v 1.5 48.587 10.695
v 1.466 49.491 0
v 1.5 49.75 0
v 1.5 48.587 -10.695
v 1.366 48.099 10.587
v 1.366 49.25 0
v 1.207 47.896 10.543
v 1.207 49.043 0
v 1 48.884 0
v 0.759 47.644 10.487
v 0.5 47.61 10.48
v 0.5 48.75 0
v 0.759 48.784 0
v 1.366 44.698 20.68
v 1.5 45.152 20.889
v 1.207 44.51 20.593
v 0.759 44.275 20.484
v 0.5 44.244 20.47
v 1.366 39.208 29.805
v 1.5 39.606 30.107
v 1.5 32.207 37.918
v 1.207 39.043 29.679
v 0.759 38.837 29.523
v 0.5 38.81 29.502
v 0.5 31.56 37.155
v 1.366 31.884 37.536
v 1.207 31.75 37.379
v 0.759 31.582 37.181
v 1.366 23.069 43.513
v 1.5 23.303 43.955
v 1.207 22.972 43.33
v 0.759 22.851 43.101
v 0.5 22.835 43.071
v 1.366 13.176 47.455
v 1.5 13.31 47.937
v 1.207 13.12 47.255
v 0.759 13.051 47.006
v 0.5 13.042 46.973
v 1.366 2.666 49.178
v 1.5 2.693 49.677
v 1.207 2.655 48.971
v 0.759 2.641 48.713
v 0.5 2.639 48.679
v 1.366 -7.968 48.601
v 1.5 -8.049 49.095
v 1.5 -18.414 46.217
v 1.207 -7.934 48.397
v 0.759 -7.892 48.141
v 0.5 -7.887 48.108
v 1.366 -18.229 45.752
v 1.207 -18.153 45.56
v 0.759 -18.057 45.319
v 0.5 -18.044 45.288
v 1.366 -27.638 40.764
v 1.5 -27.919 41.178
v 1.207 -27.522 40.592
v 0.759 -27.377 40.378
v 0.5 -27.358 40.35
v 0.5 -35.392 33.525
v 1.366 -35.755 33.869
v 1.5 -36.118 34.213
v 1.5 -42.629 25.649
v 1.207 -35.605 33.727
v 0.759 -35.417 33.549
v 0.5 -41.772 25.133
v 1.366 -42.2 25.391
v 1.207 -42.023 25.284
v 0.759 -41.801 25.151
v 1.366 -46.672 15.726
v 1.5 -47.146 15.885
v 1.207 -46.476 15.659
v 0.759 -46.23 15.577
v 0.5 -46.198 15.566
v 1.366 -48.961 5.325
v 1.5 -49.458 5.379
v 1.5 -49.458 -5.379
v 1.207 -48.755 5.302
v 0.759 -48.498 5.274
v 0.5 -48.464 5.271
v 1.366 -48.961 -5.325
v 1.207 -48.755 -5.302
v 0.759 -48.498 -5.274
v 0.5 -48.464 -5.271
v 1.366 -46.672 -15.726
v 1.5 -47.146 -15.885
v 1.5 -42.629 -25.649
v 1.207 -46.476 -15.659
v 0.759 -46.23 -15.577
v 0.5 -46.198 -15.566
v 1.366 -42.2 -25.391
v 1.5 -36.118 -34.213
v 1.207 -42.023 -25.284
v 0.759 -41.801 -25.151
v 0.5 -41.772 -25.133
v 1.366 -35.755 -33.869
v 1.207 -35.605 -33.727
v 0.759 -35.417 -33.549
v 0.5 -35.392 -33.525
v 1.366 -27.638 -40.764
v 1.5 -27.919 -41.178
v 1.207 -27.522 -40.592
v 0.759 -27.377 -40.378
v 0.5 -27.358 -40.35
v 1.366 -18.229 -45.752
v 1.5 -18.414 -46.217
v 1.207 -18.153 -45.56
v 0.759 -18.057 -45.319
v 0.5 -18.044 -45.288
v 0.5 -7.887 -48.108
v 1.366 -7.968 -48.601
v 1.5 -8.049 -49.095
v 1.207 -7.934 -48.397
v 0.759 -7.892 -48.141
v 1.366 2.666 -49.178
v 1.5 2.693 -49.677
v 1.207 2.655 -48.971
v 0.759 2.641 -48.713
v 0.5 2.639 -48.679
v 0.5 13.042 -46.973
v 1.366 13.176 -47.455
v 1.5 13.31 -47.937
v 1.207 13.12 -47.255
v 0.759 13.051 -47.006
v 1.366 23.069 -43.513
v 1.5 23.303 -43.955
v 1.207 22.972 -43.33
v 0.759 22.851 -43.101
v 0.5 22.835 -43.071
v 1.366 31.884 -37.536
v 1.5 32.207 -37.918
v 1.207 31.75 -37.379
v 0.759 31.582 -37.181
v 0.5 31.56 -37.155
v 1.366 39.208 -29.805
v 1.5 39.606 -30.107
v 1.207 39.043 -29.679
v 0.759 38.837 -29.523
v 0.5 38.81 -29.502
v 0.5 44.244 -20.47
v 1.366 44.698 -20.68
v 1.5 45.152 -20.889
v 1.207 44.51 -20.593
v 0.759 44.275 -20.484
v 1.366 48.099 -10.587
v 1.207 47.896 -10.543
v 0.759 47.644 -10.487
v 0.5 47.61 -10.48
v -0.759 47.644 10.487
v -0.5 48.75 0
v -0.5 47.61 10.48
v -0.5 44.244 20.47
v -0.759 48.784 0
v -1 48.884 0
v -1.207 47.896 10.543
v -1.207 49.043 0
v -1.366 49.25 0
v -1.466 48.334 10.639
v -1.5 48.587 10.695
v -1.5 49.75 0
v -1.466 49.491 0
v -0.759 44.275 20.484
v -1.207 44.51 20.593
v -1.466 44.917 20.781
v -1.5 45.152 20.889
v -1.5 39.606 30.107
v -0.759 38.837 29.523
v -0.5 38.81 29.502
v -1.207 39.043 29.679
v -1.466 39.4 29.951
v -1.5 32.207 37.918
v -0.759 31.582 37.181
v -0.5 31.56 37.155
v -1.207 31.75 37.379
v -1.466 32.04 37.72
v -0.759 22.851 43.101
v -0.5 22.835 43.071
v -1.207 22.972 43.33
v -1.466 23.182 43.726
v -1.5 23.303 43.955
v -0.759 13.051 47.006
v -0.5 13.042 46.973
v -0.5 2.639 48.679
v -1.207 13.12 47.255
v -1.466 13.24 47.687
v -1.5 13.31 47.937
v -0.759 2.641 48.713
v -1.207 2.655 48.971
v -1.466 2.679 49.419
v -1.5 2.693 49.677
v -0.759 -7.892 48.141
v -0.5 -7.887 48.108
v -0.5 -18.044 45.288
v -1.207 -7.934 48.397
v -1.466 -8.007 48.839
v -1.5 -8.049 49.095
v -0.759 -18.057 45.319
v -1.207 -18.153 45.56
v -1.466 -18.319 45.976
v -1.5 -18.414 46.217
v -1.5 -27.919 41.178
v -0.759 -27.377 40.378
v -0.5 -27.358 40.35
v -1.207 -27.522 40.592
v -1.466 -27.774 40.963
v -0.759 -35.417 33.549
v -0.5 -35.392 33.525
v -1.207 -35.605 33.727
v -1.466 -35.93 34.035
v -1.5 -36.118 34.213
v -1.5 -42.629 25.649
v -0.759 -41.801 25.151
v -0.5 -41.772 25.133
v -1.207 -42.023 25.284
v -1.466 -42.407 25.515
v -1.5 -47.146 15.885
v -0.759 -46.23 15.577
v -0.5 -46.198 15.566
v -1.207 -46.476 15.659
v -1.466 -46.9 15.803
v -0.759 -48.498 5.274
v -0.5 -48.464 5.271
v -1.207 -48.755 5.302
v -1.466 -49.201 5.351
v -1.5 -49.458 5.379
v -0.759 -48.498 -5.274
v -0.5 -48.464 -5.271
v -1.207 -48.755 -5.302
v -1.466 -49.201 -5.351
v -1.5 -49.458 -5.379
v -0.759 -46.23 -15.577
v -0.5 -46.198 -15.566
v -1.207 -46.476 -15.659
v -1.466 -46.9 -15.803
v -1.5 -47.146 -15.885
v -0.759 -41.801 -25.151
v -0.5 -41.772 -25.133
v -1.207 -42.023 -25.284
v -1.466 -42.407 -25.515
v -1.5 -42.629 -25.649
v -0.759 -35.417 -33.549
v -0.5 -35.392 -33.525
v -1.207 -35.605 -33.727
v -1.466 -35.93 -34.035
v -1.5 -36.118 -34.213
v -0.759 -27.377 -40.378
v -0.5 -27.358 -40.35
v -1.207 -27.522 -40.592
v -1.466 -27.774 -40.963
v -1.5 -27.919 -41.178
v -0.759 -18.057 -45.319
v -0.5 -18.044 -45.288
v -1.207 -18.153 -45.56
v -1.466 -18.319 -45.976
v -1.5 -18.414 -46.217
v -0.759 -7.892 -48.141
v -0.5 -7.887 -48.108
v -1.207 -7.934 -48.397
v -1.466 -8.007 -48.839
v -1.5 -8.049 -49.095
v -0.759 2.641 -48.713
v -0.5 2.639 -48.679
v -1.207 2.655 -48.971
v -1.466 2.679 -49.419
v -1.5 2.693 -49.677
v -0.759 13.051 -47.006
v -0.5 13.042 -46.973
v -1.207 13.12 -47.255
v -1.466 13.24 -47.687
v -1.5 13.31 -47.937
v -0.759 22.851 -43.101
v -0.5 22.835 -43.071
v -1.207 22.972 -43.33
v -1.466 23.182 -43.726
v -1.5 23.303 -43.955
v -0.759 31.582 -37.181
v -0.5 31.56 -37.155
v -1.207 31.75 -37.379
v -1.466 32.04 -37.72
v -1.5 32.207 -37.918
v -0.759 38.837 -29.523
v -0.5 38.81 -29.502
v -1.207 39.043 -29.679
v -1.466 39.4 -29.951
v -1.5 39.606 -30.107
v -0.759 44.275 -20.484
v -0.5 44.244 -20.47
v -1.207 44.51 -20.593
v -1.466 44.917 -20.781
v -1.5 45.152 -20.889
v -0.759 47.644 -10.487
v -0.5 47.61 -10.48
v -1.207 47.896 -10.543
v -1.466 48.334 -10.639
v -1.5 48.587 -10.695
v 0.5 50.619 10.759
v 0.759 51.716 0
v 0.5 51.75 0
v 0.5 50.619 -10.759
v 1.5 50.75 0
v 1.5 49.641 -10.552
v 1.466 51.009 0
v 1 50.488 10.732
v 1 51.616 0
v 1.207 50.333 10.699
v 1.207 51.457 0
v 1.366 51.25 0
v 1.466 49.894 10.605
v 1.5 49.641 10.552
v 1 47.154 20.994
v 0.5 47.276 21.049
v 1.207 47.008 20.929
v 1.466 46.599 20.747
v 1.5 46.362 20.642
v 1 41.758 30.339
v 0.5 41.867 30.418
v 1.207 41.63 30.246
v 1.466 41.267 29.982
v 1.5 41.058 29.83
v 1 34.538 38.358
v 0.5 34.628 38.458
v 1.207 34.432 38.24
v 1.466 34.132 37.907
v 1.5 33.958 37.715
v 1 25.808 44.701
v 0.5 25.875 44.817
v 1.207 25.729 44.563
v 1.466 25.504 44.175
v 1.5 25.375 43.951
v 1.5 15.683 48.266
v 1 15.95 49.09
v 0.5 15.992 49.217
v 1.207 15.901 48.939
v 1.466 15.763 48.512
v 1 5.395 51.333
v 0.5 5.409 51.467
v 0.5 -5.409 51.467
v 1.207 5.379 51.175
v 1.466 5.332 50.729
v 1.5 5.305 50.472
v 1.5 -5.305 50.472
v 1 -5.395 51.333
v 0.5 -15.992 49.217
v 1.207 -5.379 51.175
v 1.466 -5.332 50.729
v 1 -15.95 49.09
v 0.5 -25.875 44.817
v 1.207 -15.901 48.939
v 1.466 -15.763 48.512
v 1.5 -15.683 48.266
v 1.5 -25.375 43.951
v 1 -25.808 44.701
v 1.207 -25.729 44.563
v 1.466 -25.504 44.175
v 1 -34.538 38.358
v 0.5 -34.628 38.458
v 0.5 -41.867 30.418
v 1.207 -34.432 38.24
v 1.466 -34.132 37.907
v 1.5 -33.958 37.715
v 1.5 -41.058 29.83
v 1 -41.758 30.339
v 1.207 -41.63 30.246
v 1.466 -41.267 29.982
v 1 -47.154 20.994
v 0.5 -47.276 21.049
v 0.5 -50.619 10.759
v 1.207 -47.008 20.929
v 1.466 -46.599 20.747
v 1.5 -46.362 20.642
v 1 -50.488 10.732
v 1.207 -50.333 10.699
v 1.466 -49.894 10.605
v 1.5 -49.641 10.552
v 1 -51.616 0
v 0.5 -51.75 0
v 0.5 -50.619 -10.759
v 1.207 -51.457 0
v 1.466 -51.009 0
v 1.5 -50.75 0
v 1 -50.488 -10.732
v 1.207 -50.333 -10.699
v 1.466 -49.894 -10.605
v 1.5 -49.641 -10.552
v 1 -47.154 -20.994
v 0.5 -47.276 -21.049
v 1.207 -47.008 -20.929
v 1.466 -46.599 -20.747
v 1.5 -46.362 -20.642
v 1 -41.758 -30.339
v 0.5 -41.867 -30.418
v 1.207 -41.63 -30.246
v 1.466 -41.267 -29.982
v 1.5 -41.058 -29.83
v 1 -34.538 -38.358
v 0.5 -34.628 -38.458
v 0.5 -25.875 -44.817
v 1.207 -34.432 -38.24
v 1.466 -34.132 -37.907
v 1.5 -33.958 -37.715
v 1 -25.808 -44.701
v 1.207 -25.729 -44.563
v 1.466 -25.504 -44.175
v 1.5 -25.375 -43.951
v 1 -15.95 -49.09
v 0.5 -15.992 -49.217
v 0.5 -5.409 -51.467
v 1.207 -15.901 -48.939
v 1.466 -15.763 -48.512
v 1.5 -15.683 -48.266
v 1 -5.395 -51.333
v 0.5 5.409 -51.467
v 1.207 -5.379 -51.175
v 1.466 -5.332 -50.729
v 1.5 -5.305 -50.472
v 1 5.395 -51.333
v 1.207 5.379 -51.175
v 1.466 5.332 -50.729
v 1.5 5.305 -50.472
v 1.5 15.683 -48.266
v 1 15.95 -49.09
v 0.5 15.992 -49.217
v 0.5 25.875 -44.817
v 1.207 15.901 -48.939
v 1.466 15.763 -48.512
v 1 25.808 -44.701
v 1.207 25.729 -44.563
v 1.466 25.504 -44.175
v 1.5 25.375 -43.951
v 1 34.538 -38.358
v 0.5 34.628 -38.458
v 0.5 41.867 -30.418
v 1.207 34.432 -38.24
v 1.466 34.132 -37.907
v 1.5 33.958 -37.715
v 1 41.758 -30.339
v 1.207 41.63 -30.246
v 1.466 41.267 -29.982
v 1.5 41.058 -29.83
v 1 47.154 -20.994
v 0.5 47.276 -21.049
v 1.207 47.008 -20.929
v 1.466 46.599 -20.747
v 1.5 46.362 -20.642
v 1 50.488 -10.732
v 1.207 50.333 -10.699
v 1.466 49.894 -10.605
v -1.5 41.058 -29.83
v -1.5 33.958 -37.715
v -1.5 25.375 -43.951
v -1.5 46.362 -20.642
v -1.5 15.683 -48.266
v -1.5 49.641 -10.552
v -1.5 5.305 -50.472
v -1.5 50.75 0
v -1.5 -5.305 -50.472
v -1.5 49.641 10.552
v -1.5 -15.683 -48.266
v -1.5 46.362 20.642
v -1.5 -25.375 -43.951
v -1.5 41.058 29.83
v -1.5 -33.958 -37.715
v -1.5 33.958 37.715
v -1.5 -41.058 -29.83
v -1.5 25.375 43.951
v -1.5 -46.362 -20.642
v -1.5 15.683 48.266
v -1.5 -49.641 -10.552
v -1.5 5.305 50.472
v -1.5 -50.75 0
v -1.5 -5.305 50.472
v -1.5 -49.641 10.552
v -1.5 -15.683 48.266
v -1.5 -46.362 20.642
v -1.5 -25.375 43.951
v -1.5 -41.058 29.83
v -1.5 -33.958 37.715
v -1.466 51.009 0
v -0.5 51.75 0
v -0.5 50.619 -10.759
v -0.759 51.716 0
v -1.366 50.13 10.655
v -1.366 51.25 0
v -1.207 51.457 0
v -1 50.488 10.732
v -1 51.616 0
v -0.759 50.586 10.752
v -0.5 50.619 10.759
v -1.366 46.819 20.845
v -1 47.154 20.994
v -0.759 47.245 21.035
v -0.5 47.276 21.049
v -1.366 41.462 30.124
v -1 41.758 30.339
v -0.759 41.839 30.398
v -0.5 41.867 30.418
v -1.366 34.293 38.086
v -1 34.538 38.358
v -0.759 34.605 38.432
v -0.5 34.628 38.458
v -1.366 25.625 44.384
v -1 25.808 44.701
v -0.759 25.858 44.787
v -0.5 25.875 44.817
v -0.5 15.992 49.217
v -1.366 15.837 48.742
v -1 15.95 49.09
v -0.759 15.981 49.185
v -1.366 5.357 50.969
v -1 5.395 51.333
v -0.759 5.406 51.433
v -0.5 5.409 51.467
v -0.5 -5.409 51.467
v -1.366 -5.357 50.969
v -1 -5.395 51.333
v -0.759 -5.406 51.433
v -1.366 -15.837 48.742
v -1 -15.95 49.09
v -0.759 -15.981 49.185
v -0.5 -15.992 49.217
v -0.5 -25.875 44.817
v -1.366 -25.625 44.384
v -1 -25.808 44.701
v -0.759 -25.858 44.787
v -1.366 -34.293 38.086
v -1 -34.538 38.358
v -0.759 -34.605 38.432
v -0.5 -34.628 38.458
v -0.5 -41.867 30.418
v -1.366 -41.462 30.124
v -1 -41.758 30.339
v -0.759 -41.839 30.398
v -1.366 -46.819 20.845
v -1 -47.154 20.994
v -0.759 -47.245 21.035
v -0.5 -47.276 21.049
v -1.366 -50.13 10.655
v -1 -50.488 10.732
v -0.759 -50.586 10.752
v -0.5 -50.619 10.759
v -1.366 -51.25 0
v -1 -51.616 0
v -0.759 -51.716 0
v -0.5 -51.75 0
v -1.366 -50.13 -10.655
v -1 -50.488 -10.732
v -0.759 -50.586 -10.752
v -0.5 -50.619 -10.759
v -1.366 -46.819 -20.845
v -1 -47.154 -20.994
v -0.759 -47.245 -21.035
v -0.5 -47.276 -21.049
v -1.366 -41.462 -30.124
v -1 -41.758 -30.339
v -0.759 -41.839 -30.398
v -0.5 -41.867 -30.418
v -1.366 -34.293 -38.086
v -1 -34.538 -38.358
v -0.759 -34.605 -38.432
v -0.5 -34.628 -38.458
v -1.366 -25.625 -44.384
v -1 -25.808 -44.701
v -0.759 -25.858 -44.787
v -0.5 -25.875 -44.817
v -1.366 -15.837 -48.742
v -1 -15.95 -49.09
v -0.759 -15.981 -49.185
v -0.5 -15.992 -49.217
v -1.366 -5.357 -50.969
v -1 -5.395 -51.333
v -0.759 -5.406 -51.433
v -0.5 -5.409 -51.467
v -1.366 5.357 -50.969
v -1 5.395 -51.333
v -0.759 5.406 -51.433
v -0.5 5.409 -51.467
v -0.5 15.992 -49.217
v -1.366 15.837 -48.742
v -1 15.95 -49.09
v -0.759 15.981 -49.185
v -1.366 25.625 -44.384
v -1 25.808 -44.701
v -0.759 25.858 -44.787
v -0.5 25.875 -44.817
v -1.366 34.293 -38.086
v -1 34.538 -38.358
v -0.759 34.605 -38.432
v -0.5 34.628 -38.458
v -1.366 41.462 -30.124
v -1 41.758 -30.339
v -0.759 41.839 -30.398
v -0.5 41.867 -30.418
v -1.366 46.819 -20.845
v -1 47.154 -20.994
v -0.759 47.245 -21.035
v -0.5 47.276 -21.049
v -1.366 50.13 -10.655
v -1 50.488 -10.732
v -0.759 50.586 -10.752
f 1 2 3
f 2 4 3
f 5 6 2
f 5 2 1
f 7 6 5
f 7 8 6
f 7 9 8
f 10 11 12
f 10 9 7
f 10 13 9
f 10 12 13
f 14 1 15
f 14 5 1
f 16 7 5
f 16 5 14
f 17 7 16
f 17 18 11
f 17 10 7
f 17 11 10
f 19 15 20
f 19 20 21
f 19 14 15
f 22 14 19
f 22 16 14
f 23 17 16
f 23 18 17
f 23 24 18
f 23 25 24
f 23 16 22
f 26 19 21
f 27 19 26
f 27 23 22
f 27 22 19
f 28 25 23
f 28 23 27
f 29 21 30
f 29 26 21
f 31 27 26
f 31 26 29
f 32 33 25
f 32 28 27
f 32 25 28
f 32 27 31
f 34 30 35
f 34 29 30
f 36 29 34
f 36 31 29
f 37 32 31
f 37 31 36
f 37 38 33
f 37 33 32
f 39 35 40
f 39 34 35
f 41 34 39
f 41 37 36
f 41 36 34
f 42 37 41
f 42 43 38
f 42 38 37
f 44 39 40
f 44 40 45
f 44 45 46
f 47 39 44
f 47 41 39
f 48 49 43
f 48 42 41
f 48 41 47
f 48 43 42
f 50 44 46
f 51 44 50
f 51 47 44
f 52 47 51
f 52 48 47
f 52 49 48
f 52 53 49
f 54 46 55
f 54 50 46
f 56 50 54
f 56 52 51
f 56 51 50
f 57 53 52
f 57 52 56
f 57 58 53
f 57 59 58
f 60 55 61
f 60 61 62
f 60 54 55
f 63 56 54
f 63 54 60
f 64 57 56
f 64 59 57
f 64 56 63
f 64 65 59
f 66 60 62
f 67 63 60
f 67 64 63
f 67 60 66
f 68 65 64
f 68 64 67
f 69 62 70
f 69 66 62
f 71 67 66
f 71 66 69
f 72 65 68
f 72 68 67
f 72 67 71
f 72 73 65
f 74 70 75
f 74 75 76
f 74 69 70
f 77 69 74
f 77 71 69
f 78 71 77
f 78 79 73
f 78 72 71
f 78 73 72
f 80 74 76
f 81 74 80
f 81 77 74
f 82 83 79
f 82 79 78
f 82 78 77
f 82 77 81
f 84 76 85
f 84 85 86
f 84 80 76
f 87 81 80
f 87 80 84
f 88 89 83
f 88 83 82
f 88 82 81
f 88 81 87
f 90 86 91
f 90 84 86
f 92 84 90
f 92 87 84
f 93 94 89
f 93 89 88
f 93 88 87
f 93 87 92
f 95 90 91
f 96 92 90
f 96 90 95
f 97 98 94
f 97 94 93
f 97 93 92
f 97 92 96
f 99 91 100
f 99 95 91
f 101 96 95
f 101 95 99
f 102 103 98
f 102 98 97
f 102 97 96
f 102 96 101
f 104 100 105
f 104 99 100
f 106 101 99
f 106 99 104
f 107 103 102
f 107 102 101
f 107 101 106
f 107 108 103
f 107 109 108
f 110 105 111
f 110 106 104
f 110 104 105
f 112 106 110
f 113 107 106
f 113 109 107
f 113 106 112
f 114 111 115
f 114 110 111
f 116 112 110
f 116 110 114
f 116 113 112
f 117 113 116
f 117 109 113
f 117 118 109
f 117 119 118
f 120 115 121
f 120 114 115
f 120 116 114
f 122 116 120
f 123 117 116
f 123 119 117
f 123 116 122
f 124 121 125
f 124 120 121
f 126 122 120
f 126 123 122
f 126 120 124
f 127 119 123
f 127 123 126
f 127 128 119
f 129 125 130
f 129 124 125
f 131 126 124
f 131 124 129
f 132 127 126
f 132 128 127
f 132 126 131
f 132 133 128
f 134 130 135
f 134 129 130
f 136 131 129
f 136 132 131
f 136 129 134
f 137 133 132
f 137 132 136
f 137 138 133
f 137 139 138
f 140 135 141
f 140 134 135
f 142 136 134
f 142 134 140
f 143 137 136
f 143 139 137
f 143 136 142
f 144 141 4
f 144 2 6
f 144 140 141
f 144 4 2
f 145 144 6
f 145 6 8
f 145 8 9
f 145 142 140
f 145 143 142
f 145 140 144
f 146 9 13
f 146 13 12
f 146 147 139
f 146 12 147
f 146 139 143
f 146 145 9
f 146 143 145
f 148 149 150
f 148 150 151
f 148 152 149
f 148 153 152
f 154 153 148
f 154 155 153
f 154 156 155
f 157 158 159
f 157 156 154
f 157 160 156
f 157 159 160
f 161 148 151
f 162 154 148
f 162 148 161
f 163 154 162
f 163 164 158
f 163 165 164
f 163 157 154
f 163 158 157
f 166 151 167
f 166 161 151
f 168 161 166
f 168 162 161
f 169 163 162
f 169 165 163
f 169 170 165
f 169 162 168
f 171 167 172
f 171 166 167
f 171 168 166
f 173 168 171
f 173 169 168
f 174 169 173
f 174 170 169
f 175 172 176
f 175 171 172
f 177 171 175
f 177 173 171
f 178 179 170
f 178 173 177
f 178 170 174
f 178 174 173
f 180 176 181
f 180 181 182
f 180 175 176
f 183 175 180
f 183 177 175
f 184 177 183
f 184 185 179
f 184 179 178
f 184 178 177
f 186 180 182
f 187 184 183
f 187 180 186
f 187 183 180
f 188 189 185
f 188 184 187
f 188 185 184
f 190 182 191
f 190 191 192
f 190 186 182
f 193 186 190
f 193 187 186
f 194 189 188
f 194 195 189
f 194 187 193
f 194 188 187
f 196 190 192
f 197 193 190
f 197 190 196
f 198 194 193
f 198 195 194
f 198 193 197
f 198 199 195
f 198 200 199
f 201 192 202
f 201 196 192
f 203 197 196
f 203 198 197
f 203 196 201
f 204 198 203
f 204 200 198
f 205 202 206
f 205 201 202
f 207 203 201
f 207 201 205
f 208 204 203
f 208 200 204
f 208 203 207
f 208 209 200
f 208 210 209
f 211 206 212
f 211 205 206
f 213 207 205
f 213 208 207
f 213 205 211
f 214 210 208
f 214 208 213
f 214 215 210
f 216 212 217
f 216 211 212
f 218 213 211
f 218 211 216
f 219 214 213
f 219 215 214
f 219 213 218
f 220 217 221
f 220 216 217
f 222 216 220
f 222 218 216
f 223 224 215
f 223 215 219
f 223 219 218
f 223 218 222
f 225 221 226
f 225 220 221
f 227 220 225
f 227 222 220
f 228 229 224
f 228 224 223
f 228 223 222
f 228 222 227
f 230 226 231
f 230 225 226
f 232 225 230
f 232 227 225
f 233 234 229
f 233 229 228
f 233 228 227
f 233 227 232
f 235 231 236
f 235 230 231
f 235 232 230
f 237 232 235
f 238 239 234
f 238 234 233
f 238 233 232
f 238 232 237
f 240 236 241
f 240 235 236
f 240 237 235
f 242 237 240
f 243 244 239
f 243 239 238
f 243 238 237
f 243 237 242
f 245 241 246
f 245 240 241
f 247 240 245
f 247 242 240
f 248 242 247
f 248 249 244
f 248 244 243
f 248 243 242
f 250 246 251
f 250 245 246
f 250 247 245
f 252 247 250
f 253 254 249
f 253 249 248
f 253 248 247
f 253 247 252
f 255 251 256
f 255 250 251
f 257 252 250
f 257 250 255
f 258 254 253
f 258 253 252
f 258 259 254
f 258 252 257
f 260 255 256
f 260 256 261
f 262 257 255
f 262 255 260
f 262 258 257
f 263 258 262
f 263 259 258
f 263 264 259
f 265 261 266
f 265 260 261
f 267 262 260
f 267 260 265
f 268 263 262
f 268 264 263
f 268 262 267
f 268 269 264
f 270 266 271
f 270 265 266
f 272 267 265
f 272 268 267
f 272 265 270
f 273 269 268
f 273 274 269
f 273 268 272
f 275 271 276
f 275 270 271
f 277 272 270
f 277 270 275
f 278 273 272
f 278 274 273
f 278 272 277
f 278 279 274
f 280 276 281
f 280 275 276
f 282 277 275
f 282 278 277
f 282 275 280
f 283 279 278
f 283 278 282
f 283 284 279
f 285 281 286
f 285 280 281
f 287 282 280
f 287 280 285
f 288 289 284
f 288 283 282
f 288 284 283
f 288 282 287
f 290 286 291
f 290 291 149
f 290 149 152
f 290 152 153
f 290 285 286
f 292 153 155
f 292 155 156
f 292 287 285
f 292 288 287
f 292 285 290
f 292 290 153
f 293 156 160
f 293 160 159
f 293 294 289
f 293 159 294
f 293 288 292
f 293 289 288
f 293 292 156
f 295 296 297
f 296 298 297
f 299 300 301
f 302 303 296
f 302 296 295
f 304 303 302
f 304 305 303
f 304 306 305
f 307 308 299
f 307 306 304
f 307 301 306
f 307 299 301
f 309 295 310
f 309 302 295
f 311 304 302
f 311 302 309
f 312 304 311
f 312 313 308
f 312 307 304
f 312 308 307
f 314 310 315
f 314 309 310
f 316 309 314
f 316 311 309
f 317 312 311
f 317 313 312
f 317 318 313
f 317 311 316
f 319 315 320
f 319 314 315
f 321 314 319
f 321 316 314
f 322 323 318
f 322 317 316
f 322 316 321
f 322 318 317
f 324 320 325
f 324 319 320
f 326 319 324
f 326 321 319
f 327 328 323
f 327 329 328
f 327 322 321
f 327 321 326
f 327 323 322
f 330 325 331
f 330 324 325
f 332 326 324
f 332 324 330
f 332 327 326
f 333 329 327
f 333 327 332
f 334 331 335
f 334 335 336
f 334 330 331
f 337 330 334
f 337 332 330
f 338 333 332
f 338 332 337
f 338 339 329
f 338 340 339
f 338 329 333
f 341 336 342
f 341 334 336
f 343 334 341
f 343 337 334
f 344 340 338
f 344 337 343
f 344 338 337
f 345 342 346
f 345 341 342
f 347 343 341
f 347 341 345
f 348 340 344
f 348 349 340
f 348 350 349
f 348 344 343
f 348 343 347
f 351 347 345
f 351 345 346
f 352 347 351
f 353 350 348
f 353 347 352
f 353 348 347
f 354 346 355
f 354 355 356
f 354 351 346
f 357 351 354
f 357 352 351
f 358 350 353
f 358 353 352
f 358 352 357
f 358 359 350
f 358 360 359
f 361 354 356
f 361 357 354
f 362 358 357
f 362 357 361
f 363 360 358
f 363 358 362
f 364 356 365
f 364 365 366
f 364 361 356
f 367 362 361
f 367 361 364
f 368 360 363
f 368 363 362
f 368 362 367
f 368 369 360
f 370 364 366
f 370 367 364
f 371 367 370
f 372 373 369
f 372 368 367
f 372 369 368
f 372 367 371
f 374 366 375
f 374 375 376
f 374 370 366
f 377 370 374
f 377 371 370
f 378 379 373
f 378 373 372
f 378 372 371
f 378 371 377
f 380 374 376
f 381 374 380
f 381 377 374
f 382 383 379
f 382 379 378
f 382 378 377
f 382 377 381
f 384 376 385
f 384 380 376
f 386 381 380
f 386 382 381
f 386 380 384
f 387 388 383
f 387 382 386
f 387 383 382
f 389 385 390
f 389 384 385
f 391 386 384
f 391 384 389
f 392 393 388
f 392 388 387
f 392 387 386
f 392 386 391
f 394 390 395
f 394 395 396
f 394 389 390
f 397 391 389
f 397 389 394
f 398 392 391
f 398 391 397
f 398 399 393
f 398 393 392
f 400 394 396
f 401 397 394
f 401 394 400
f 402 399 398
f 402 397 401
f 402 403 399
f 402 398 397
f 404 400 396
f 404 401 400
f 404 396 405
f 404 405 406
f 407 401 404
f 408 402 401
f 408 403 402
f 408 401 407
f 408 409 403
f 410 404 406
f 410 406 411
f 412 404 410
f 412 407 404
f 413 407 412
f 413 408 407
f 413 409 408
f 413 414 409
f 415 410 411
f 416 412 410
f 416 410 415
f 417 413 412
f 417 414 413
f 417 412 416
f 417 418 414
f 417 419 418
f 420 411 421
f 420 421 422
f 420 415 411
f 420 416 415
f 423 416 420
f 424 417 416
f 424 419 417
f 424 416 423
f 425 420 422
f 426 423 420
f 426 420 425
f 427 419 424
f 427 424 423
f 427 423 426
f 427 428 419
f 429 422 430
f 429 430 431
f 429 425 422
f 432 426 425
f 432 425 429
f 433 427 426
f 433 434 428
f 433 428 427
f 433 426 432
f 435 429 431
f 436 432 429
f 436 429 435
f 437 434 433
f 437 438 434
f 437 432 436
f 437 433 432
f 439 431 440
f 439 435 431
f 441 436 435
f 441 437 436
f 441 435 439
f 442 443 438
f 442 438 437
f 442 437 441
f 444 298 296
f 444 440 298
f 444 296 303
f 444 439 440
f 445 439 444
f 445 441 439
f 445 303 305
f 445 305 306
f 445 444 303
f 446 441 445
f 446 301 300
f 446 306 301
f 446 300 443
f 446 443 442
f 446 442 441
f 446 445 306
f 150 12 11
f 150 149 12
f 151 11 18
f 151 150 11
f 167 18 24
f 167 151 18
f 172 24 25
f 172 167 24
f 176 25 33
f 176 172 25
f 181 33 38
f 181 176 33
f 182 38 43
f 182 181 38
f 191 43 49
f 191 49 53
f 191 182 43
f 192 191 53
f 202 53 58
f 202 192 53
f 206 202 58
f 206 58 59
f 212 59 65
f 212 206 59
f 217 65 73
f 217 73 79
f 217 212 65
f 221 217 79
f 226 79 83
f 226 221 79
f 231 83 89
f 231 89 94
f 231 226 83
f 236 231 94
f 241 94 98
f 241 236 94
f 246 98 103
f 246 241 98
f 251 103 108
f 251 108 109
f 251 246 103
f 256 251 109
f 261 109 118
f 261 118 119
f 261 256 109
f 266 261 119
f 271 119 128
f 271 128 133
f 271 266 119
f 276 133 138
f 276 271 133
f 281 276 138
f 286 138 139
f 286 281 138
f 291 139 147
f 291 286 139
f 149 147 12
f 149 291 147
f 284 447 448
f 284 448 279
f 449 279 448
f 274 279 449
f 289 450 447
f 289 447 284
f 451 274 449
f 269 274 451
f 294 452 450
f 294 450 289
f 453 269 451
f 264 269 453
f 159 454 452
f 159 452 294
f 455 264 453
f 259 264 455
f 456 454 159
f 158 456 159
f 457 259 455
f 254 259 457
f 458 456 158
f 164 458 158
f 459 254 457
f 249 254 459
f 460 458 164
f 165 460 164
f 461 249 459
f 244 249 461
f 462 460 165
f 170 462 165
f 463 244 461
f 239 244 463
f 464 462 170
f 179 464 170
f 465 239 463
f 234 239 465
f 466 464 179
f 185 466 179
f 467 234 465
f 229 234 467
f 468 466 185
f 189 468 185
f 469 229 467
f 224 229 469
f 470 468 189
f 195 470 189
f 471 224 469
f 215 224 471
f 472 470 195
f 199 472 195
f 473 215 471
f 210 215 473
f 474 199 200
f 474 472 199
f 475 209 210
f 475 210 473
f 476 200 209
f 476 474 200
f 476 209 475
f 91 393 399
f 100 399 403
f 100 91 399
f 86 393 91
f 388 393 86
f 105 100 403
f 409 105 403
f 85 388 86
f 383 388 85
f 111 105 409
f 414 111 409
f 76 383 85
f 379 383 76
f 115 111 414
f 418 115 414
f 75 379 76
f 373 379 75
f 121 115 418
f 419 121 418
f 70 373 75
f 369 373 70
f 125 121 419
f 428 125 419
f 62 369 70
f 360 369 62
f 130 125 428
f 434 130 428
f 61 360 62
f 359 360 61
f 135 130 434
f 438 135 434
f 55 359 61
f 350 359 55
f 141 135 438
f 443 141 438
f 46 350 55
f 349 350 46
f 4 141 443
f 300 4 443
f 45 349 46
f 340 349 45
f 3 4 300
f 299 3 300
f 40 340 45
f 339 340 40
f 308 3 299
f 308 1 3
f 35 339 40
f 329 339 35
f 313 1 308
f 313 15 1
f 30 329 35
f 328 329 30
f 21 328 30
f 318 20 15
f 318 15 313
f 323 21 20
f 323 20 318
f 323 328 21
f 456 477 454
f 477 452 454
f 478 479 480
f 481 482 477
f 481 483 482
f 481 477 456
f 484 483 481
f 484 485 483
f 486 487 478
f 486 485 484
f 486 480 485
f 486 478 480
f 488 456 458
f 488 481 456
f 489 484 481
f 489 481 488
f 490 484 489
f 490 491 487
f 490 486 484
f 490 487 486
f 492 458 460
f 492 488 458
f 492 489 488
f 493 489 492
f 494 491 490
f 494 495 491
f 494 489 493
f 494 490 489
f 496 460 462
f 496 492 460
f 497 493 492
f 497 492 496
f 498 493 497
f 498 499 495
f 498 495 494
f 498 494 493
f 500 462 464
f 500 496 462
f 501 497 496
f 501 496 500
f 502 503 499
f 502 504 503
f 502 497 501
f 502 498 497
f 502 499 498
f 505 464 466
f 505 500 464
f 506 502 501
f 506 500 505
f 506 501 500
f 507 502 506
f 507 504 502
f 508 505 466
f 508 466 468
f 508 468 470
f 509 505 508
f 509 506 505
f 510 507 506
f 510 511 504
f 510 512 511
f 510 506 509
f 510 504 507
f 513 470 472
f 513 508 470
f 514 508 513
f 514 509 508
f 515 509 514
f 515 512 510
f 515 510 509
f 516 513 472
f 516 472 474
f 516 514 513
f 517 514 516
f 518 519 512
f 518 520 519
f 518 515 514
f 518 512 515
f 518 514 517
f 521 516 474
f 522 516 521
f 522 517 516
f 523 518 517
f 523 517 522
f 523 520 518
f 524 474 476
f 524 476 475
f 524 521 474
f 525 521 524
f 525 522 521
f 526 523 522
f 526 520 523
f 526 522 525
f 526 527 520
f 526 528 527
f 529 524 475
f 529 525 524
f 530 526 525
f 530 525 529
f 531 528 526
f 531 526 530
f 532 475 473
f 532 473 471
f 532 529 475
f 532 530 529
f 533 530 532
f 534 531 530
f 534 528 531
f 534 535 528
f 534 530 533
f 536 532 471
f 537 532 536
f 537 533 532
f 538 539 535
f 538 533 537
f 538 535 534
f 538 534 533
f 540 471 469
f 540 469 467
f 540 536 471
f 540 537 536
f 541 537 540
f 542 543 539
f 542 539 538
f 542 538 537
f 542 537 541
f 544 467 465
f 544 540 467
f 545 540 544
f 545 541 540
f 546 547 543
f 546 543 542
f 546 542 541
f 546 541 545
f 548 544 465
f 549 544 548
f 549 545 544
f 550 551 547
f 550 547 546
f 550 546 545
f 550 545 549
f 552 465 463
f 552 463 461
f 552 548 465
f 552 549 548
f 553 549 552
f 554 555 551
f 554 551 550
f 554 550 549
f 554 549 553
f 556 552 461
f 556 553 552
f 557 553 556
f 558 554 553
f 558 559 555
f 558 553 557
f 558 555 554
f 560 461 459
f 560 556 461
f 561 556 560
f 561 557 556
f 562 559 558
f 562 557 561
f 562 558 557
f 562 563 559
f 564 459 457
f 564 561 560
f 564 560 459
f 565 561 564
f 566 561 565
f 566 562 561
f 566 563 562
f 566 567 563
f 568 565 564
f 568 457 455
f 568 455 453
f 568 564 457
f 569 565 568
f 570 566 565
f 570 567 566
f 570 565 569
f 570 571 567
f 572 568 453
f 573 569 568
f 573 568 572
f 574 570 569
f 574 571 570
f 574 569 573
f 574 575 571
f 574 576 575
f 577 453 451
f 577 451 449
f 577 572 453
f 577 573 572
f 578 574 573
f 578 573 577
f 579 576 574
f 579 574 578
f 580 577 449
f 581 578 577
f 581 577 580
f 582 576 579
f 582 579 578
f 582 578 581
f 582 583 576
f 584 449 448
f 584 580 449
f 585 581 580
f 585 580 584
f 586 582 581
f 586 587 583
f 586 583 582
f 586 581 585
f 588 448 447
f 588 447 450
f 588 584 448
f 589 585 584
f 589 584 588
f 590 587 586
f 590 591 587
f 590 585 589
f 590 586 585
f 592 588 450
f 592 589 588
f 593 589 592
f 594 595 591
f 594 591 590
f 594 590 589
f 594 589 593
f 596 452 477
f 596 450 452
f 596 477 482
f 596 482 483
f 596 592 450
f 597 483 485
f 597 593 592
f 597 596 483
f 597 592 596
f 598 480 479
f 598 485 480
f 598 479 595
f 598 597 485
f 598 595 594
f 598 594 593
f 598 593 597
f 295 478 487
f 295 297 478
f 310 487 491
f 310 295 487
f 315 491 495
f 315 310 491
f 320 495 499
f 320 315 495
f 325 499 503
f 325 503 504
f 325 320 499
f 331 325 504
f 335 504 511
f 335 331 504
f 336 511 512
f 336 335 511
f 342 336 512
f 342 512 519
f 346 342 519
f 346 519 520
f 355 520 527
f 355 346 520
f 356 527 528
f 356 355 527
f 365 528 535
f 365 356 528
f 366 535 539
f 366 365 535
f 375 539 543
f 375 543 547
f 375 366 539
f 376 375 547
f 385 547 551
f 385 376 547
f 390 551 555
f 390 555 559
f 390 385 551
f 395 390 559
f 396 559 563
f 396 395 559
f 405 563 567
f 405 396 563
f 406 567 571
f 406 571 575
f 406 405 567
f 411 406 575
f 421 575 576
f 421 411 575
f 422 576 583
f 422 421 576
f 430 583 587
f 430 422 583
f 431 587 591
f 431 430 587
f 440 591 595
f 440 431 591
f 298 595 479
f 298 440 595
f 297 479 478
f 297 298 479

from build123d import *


with BuildPart() as part:
    # Schizzo1 → Rivoluzione1 (revolve)
    with BuildSketch(Plane.XY):
        with BuildLine():
            Line((-0.5, 51.75), (0.5, 51.75))
            ThreePointArc((0.5, 51.75), (1.207106781, 51.457106781), (1.5, 50.75))
            Line((1.5, 50.75), (1.5, 49.75))
            ThreePointArc((1.5, 49.75), (1.207106781, 49.042893219), (0.5, 48.75))
            Line((0.5, 48.75), (-0.5, 48.75))
            ThreePointArc((-0.5, 48.75), (-1.207106781, 49.042893219), (-1.5, 49.75))
            Line((-1.5, 49.75), (-1.5, 50.75))
            ThreePointArc((-1.5, 50.75), (-1.207106781, 51.457106781), (-0.5, 51.75))
        make_face()
    revolve(axis=Axis((0, 0, 0), (1, 0, 0)))


solid = part.part
